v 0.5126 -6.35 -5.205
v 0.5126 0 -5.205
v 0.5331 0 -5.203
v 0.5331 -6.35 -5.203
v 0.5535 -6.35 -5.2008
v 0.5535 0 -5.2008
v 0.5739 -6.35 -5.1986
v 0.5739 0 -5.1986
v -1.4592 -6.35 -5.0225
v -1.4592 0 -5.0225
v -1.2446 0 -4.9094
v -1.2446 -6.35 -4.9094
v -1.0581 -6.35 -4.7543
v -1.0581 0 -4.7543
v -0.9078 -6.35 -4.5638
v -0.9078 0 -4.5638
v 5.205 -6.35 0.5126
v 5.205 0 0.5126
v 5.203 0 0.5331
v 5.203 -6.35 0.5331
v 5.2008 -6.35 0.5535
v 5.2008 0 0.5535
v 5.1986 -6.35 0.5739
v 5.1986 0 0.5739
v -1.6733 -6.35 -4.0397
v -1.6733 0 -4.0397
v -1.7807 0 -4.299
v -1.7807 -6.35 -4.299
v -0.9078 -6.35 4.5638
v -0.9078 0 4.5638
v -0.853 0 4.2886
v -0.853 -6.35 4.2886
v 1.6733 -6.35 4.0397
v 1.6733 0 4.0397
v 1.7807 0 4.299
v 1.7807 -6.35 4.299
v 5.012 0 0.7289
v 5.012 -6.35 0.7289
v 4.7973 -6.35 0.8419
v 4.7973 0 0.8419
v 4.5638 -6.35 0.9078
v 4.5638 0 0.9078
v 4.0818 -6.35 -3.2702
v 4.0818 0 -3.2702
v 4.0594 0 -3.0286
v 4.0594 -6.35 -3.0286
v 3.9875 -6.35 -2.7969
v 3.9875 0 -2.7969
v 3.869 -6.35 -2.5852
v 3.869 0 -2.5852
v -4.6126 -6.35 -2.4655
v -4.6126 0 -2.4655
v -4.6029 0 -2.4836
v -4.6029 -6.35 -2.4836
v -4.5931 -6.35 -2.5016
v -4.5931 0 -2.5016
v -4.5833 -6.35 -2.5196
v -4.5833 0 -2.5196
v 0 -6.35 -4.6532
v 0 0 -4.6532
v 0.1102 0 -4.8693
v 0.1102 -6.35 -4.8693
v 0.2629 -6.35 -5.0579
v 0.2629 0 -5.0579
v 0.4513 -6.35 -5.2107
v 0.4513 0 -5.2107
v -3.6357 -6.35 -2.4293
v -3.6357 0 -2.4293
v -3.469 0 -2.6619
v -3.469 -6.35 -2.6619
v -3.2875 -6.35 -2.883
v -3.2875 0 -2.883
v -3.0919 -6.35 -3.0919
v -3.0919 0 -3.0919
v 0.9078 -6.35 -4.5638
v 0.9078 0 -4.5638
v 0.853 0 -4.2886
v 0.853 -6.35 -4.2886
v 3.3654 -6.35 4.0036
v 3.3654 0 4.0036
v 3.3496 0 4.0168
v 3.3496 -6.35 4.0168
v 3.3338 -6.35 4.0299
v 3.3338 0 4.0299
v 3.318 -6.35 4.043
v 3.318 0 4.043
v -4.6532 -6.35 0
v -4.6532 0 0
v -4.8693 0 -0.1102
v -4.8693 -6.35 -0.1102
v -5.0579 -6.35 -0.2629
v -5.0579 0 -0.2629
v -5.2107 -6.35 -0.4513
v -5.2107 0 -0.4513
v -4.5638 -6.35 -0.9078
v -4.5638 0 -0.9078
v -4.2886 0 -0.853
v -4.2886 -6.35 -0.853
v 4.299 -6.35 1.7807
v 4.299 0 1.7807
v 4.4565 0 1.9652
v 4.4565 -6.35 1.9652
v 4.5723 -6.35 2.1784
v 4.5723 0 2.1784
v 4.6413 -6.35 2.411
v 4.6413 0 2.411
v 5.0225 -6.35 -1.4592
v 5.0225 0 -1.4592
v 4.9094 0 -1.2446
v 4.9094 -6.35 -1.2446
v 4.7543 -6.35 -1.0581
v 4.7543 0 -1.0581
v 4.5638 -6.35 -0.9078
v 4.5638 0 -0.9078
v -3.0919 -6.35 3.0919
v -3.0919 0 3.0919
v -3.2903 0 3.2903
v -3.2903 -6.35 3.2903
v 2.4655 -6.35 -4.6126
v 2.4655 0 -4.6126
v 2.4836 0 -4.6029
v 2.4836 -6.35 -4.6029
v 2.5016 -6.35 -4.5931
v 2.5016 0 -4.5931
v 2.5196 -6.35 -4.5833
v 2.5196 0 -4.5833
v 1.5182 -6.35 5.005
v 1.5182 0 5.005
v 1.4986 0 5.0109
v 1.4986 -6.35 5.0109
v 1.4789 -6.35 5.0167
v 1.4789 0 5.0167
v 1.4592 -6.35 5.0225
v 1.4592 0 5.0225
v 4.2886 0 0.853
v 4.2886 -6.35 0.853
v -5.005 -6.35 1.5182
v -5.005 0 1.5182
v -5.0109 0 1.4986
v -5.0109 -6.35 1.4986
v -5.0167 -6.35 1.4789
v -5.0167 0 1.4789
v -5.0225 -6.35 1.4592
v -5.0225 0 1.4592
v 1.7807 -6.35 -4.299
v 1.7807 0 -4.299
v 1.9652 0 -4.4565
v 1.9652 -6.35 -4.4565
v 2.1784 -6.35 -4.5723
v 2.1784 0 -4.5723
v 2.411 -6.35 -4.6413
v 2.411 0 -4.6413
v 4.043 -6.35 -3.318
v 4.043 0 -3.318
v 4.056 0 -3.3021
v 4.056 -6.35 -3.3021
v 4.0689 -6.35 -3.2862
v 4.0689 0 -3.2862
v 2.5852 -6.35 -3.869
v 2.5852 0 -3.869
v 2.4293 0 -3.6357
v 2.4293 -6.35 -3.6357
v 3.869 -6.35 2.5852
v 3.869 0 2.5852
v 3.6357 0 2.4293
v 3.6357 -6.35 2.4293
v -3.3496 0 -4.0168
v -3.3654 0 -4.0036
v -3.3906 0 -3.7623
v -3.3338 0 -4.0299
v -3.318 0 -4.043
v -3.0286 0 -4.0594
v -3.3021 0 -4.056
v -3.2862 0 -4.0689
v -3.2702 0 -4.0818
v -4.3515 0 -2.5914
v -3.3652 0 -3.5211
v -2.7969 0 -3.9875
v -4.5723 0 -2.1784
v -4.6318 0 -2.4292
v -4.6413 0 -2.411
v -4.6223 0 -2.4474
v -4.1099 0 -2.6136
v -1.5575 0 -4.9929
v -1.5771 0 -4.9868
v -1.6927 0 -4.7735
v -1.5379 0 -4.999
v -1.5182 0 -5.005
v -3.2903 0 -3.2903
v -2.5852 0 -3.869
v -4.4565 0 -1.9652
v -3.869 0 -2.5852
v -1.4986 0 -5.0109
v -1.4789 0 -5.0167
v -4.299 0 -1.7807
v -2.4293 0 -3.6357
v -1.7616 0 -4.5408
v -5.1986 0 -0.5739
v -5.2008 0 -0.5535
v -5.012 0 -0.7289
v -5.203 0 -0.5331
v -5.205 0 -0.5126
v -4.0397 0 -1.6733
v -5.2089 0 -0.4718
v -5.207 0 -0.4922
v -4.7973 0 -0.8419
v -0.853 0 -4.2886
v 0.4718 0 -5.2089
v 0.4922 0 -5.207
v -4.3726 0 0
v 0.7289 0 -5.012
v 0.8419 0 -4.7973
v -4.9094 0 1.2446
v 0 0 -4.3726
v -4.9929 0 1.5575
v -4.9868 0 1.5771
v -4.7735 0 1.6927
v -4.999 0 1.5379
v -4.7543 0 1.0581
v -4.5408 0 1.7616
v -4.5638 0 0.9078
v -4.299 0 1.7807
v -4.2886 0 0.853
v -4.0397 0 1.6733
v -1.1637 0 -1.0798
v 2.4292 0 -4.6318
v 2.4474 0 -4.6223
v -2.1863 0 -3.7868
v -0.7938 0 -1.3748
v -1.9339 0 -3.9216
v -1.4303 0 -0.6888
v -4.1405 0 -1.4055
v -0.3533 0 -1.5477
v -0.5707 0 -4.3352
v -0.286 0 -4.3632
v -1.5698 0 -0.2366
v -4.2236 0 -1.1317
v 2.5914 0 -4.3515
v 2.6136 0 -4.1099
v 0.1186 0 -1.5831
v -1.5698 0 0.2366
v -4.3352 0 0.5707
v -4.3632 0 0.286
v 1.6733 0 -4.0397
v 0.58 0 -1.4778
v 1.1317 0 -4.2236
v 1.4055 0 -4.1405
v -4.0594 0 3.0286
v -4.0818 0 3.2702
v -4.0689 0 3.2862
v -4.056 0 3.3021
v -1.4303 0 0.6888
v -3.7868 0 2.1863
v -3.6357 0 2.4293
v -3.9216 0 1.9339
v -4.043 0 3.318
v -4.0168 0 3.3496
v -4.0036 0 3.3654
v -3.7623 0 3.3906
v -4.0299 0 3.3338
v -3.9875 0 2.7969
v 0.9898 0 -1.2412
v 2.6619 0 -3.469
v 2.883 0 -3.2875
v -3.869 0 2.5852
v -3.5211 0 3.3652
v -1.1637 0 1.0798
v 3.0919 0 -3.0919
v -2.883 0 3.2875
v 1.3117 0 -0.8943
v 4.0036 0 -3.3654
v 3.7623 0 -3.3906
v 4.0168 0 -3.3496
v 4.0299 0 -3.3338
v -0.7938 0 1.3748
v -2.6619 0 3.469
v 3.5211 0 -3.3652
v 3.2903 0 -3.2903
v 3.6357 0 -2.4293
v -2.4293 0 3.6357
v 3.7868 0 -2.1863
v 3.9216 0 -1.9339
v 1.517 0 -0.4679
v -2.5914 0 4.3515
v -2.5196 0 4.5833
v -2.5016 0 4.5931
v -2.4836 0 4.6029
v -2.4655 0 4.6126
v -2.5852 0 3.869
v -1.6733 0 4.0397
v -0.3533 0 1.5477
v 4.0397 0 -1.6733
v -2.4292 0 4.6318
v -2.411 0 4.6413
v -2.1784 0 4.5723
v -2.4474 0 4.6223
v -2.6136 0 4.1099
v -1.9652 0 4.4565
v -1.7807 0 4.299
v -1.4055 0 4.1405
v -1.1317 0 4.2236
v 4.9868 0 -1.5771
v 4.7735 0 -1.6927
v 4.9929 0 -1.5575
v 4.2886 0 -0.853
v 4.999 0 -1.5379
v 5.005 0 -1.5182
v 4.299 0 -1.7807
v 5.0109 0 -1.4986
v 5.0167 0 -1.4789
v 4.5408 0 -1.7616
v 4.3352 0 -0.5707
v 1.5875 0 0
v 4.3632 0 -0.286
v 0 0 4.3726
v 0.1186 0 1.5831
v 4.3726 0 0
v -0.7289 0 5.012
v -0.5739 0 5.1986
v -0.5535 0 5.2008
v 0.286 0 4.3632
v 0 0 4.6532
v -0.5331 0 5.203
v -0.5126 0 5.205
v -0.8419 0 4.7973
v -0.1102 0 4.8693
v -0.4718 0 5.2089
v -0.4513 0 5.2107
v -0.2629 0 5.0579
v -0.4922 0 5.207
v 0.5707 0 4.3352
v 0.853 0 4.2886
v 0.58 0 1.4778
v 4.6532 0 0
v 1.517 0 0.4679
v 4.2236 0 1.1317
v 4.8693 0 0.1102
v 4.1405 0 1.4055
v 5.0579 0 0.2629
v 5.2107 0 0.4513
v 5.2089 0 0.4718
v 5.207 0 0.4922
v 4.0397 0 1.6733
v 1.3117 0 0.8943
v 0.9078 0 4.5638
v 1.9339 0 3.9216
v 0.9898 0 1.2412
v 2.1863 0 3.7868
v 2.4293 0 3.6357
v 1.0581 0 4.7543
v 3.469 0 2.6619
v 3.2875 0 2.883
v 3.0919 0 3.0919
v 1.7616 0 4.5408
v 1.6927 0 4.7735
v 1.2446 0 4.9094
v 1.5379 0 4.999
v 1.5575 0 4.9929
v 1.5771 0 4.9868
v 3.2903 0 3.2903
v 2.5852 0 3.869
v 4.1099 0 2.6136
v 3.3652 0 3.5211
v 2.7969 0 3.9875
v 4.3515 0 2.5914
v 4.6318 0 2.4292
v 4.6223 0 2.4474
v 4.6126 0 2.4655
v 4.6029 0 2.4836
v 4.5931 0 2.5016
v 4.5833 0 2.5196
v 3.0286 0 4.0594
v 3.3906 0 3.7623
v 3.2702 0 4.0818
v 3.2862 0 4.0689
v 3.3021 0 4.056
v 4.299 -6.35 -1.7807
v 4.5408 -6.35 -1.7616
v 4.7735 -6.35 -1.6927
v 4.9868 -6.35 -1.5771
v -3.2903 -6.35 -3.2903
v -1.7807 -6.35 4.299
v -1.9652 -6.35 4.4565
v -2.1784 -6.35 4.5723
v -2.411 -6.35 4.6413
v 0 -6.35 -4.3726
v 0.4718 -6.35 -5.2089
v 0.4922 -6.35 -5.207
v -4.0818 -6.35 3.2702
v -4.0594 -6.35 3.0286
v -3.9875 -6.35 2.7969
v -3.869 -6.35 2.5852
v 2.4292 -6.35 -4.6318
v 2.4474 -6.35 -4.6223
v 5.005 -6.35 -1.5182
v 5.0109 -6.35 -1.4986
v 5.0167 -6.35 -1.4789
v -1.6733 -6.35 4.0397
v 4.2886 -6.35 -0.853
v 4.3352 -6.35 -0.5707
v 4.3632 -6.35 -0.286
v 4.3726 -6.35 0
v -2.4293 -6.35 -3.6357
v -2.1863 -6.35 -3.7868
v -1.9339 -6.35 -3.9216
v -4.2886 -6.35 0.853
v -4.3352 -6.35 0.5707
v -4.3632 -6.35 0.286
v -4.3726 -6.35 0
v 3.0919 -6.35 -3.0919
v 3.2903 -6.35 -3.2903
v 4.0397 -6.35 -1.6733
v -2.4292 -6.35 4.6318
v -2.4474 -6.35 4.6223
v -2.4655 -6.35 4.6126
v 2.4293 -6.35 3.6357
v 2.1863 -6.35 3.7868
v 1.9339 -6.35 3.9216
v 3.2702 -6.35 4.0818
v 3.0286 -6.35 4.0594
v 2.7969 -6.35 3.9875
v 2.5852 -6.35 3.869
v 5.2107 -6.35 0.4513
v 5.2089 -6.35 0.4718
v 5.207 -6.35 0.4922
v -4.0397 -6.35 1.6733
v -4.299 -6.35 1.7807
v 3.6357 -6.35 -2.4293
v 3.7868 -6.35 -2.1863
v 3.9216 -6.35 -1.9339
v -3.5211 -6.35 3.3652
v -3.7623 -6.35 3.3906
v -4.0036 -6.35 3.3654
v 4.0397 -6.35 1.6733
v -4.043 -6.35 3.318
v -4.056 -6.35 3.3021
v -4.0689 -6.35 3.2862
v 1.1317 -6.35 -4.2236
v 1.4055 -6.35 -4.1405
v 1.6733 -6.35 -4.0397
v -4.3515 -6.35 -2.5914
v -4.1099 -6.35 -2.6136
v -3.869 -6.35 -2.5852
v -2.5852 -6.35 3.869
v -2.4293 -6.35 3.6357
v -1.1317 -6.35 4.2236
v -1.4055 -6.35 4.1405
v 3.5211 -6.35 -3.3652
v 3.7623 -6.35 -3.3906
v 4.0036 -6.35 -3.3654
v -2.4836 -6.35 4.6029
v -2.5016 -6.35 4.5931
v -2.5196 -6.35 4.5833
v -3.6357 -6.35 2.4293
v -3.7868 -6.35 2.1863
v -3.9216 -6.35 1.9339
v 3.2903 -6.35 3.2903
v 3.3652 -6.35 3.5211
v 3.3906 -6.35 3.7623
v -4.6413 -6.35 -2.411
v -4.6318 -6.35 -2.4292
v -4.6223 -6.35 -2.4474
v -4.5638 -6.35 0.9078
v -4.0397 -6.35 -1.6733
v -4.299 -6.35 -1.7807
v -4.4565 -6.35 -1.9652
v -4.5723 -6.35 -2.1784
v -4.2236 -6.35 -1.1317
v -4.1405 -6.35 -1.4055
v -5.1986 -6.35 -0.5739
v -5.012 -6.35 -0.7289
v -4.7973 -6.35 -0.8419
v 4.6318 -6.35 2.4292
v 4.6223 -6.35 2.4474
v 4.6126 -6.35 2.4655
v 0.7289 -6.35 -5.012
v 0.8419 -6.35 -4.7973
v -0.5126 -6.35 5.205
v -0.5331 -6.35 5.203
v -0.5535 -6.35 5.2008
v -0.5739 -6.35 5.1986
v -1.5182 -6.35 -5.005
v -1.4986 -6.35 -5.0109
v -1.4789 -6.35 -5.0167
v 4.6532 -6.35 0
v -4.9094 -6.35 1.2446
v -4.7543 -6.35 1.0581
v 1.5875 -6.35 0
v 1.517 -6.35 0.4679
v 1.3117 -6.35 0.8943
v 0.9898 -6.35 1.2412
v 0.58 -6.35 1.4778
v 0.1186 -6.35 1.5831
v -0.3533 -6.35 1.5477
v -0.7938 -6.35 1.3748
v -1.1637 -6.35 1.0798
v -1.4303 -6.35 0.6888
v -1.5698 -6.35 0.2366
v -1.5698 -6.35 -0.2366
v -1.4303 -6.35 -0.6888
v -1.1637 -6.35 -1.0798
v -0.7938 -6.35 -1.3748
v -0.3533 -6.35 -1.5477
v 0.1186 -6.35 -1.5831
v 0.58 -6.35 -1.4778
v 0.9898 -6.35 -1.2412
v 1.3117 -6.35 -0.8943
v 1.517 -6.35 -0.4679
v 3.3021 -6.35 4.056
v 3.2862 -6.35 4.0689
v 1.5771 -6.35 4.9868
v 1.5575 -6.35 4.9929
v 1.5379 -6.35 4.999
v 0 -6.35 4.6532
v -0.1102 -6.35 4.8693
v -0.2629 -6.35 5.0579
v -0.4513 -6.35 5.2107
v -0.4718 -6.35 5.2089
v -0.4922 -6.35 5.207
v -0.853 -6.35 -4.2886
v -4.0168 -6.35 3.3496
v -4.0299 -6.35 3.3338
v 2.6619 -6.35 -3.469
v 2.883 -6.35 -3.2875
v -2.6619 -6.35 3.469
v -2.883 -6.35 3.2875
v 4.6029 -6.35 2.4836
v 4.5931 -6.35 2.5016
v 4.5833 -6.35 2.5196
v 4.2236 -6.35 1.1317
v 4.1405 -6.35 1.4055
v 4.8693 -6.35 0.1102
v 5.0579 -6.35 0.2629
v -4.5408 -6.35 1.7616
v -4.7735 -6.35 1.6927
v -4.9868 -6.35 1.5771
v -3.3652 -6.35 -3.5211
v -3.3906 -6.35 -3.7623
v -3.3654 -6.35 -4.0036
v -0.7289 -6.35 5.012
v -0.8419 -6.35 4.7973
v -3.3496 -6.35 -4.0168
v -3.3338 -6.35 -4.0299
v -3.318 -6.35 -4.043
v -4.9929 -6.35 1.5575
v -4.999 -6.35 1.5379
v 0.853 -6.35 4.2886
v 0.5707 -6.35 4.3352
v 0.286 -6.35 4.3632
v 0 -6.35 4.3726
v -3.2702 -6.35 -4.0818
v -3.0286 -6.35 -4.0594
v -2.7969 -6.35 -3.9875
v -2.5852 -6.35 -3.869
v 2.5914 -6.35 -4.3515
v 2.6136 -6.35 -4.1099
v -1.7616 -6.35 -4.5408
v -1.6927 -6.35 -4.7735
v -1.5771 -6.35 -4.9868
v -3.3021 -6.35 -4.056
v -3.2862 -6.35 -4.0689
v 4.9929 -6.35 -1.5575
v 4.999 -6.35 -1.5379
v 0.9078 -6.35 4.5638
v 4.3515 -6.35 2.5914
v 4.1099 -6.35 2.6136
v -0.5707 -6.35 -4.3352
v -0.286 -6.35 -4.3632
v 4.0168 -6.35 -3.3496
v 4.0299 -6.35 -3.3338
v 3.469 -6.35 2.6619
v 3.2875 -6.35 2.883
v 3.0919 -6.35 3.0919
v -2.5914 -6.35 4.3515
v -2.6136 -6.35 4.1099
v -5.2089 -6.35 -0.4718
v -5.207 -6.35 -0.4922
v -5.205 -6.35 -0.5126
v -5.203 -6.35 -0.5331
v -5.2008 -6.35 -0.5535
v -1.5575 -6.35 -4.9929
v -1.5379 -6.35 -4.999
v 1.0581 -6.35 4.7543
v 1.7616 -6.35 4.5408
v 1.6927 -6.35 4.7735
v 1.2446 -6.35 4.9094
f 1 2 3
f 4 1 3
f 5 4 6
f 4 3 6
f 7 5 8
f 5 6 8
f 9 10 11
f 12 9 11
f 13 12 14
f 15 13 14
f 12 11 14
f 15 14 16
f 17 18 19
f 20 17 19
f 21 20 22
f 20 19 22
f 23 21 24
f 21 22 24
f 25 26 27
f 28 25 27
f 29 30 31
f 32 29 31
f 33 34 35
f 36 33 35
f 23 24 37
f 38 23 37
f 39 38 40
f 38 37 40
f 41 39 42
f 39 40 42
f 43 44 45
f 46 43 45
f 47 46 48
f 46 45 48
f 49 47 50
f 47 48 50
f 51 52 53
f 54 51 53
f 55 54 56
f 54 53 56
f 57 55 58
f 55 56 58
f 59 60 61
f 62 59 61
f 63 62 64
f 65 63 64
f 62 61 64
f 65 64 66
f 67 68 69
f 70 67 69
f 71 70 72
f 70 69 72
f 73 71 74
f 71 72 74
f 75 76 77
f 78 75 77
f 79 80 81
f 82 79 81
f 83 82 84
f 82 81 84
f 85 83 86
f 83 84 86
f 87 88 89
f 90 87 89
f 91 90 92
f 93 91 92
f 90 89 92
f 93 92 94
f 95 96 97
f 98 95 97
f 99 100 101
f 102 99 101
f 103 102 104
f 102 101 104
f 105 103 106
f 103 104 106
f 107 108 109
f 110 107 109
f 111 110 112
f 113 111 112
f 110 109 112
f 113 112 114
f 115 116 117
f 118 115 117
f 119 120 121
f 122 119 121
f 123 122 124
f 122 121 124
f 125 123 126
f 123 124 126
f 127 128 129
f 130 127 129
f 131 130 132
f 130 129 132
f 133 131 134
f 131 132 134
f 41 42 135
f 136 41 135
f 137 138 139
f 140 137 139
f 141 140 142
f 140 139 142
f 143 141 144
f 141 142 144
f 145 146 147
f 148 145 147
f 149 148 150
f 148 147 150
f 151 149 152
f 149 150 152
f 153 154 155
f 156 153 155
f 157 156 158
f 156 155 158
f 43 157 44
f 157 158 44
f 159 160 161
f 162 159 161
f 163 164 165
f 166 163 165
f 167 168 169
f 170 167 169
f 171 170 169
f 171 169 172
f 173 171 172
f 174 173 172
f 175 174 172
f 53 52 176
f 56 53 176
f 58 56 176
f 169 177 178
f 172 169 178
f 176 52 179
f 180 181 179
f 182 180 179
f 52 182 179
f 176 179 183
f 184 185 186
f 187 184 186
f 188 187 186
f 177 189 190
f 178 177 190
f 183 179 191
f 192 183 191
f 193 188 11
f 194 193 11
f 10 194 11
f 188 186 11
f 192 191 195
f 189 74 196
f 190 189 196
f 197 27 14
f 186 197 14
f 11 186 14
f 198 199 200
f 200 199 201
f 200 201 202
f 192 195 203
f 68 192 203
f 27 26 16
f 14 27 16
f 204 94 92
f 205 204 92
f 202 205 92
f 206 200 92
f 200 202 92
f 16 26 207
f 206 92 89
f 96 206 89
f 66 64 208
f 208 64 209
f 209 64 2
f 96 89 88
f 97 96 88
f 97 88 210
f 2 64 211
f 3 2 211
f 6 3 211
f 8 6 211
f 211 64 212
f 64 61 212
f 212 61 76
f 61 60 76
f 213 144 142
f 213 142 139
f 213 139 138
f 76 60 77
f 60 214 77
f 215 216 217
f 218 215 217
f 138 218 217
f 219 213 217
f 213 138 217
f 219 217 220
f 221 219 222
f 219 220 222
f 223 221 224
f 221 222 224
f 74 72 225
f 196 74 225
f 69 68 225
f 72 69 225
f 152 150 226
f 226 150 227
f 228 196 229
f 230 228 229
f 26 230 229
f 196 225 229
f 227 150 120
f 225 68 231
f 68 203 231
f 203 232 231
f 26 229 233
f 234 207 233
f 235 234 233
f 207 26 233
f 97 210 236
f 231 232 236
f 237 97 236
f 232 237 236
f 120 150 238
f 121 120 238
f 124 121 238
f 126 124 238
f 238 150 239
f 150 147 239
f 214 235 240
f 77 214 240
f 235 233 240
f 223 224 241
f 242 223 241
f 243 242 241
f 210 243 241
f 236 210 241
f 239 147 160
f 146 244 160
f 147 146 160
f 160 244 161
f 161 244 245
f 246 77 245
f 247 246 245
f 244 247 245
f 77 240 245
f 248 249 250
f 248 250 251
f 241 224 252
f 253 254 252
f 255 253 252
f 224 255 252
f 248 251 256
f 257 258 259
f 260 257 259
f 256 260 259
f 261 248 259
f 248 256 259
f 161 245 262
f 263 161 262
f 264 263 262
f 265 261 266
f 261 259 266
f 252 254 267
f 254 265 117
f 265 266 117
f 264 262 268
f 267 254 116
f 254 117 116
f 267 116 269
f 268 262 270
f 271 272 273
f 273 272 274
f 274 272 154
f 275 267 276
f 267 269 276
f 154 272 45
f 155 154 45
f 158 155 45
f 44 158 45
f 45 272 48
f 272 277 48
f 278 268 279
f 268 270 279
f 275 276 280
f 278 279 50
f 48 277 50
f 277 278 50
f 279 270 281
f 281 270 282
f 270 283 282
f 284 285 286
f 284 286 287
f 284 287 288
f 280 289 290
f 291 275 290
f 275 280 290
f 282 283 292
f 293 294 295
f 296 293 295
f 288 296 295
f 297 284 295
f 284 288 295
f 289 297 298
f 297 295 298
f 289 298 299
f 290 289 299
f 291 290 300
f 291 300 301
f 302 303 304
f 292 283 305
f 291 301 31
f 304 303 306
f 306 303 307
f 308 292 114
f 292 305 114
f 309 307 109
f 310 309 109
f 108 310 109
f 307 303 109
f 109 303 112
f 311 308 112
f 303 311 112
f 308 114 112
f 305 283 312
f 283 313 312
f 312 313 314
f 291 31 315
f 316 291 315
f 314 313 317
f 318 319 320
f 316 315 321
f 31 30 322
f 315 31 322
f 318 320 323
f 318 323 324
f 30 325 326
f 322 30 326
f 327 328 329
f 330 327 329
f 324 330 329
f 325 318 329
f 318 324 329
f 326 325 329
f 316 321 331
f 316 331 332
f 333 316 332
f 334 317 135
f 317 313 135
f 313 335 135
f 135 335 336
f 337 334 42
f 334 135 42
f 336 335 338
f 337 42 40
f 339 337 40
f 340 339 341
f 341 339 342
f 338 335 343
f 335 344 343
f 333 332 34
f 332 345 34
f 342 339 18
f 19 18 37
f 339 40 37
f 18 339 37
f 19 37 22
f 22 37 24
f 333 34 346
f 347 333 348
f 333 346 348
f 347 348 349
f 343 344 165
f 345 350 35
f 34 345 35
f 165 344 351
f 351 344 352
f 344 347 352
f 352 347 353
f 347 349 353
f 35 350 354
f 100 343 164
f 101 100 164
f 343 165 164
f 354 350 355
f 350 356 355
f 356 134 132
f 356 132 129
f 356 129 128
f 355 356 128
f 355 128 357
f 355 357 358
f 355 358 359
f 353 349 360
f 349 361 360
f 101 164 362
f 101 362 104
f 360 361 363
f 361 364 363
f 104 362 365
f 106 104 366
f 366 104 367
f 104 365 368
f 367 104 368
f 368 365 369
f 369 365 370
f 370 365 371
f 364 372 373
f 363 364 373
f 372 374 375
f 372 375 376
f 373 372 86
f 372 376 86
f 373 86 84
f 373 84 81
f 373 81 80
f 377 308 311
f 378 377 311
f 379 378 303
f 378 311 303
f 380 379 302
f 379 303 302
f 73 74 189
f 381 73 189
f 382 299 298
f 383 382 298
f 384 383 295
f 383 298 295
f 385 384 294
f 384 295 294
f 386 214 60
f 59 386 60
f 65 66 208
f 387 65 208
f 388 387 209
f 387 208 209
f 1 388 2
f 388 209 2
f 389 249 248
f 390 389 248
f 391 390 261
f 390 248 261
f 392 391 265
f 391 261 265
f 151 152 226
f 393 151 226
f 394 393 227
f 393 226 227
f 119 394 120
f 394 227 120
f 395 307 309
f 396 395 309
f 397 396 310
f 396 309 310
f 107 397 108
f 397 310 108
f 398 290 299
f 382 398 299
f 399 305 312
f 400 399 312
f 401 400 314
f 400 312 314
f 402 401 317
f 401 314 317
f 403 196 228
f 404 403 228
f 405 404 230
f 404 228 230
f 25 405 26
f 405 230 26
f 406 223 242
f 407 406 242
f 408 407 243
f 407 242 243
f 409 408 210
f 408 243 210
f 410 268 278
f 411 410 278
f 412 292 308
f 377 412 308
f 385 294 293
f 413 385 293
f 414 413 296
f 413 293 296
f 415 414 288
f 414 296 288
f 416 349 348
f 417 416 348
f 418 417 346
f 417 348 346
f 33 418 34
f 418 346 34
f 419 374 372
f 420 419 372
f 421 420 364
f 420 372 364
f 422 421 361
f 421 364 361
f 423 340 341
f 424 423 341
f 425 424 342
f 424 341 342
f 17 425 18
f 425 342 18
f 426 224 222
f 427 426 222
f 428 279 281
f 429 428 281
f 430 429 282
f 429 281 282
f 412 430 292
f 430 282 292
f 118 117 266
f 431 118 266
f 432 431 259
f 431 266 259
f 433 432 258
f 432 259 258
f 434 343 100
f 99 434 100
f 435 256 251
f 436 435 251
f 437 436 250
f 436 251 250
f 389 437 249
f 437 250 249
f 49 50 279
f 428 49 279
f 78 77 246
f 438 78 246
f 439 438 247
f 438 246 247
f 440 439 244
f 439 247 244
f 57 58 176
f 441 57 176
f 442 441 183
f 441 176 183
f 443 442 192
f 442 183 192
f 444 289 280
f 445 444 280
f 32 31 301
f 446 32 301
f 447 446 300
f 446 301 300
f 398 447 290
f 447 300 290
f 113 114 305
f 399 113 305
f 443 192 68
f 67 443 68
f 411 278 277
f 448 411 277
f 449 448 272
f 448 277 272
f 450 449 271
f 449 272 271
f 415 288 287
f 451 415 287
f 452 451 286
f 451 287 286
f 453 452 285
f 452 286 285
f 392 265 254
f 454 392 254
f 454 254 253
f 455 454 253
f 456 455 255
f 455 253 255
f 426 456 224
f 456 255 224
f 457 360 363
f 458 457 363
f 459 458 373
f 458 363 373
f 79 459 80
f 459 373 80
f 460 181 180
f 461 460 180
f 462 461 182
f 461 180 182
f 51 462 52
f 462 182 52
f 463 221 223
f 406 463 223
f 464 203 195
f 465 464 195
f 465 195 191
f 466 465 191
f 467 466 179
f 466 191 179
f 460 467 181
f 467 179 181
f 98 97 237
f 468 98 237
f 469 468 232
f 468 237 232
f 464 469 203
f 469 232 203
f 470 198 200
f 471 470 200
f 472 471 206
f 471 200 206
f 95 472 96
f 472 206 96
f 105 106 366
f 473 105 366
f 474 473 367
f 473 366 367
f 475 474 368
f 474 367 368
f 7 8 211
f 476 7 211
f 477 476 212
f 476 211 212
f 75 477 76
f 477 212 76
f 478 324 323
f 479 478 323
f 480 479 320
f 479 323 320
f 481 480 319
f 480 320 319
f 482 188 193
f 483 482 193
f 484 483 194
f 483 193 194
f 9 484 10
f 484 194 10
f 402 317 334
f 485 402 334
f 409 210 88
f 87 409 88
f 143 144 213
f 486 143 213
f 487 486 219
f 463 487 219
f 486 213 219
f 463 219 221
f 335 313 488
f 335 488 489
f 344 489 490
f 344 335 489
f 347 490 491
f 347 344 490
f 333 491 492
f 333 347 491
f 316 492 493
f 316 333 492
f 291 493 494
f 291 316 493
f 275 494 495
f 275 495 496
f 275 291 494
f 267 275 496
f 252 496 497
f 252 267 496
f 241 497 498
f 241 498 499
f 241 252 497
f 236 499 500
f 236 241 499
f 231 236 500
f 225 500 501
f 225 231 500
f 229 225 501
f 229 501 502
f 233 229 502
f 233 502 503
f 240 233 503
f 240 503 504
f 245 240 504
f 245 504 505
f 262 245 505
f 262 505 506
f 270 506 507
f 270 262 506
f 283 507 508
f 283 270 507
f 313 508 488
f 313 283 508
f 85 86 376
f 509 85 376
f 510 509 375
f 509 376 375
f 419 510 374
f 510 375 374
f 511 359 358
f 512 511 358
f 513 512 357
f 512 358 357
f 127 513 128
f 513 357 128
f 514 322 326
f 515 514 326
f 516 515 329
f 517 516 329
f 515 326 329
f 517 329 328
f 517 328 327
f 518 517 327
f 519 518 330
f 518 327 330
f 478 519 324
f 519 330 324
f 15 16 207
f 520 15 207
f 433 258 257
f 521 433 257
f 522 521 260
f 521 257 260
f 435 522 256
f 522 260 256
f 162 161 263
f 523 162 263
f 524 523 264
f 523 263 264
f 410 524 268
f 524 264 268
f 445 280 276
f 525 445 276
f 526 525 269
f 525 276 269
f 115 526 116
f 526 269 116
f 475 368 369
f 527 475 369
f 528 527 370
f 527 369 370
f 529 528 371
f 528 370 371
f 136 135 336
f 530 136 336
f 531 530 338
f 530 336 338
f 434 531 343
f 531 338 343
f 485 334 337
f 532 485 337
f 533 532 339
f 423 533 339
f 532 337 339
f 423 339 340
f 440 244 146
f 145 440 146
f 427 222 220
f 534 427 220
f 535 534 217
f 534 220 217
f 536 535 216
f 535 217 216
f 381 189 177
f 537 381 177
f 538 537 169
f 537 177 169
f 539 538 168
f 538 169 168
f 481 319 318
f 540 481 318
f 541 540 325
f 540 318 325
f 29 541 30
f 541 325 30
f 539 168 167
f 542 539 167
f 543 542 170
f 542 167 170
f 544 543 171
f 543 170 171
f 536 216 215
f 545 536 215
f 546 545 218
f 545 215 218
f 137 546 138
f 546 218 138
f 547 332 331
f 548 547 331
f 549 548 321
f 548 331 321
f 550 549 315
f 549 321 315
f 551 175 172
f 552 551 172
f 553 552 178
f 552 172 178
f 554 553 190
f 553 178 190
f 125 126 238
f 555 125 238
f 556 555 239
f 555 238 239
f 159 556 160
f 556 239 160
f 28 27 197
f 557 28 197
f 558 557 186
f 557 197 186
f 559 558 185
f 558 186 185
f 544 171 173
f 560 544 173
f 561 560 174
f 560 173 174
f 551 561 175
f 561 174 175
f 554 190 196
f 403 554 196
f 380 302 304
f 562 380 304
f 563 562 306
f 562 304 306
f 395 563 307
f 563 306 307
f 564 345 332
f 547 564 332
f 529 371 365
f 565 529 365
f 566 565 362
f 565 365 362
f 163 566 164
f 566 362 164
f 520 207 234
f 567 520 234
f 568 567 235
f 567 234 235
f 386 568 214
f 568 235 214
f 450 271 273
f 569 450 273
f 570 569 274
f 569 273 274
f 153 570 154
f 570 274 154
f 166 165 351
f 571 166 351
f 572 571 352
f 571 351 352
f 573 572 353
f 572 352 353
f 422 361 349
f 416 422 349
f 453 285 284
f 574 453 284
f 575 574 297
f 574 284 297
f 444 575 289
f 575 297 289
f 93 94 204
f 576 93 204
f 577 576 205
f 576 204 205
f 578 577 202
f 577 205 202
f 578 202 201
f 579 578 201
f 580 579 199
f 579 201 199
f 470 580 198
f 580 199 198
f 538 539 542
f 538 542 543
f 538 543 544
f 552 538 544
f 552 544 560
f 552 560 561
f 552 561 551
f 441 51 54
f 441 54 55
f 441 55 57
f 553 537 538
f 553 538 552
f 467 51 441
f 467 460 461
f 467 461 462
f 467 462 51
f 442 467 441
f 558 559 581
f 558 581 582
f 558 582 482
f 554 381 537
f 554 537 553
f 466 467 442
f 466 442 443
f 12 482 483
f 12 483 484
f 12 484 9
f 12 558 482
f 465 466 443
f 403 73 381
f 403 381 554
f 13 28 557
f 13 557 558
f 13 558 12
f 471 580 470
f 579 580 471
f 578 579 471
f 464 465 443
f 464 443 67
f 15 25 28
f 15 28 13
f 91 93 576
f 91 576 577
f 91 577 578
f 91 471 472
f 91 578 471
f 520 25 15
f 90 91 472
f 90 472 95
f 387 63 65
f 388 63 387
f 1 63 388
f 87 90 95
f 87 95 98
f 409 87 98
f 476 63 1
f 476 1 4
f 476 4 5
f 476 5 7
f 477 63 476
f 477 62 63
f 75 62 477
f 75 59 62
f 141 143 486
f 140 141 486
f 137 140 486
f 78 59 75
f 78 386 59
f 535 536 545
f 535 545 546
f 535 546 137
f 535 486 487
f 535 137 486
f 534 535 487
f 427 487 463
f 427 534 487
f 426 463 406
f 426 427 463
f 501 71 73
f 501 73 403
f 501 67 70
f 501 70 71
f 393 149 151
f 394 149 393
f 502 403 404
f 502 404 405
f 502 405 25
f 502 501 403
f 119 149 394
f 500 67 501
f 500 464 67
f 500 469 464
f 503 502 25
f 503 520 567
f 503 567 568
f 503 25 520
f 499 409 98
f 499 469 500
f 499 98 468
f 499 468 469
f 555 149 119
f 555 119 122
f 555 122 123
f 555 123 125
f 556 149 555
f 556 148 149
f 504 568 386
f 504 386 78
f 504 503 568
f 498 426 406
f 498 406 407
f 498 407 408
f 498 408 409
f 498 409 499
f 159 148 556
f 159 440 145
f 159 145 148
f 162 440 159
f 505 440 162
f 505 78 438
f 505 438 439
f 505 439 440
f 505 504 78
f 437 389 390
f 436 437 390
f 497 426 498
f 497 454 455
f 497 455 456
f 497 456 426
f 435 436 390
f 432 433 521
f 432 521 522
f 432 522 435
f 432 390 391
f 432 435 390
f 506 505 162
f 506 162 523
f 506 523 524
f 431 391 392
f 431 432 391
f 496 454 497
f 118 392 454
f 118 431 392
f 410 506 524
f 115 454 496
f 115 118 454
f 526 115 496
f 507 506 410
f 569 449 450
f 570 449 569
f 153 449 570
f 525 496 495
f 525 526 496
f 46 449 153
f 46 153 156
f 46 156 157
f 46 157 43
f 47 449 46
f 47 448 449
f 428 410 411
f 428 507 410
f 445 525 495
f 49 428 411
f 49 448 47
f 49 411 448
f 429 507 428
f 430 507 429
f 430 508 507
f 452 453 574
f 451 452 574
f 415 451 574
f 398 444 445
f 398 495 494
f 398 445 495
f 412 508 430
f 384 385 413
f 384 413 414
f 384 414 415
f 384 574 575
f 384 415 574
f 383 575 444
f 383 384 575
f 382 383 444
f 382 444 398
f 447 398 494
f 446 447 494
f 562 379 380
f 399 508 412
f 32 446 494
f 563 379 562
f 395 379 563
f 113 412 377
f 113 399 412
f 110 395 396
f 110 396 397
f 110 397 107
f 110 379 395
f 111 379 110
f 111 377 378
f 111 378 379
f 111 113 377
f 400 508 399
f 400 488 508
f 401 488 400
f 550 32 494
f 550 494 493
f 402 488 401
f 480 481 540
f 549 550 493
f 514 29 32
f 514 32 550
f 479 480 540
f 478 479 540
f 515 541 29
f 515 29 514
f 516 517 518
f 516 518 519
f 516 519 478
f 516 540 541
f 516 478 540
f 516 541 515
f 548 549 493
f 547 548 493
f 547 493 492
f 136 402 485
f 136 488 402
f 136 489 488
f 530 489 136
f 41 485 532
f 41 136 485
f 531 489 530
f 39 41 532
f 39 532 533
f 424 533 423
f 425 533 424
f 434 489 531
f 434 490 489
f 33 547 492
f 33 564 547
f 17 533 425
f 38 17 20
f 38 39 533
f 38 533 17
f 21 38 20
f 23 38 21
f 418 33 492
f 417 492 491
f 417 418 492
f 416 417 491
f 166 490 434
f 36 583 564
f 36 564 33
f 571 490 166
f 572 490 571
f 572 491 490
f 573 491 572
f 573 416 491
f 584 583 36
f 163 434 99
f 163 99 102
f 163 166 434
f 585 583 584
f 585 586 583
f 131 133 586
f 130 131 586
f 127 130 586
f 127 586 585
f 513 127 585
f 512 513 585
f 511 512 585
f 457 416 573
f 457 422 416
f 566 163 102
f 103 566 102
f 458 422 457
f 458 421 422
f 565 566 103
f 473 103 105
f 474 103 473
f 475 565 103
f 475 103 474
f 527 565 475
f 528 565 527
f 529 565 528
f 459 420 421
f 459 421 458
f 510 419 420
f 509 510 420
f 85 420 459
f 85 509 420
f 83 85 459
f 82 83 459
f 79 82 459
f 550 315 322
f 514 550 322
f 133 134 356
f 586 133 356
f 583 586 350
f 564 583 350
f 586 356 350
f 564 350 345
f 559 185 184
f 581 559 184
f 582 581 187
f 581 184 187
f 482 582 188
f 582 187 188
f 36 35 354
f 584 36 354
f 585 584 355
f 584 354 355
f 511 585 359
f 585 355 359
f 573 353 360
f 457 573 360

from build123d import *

# Parameters (mm, degrees)
F0_R     = 1.5875
F1_DEPTH = 6.35


with BuildPart() as f1:
    # F0 (on Front) → F1 (new body)
    with BuildSketch(Plane.XZ):
        with BuildLine():
            ThreePointArc((0, 4.653198), (-0.181622, 4.967595), (-0.451324, 5.210686))
            ThreePointArc((-0.451324, 5.210686), (-0.481995, 5.207938), (-0.512649, 5.20501))
            ThreePointArc((-0.512649, 5.20501), (-0.543285, 5.201901), (-0.573903, 5.198613))
            ThreePointArc((-0.573903, 5.198613), (-0.790998, 4.907577), (-0.907794, 4.563788))
            Line((-0.907794, 4.563788), (-0.853047, 4.288558))
            ThreePointArc((-0.853047, 4.288558), (-1.269292, 4.184294), (-1.673312, 4.039734))
            Line((-1.673312, 4.039734), (-1.780702, 4.298995))
            ThreePointArc((-1.780702, 4.298995), (-2.068813, 4.519956), (-2.411012, 4.641332))
            ThreePointArc((-2.411012, 4.641332), (-2.438297, 4.627056), (-2.465497, 4.61262))
            ThreePointArc((-2.465497, 4.61262), (-2.492612, 4.598024), (-2.51964, 4.583269))
            ThreePointArc((-2.51964, 4.583269), (-2.608835, 4.231308), (-2.585178, 3.868993))
            Line((-2.585178, 3.868993), (-2.429273, 3.635664))
            ThreePointArc((-2.429273, 3.635664), (-2.773933, 3.380047), (-3.091878, 3.091878))
            Line((-3.091878, 3.091878), (-3.290308, 3.290308))
            ThreePointArc((-3.290308, 3.290308), (-3.641046, 3.384194), (-4.003645, 3.365377))
            ThreePointArc((-4.003645, 3.365377), (-4.02339, 3.341747), (-4.042995, 3.318))
            ThreePointArc((-4.042995, 3.318), (-4.06246, 3.294139), (-4.081785, 3.270164))
            ThreePointArc((-4.081785, 3.270164), (-4.029501, 2.910861), (-3.868993, 2.585178))
            Line((-3.868993, 2.585178), (-3.635664, 2.429273))
            ThreePointArc((-3.635664, 2.429273), (-3.856268, 2.061218), (-4.039734, 1.673312))
            Line((-4.039734, 1.673312), (-4.298995, 1.780702))
            ThreePointArc((-4.298995, 1.780702), (-4.658963, 1.73322), (-4.98676, 1.577074))
            ThreePointArc((-4.98676, 1.577074), (-4.995959, 1.547687), (-5.004984, 1.518245))
            ThreePointArc((-5.004984, 1.518245), (-5.013837, 1.488752), (-5.022515, 1.459206))
            ThreePointArc((-5.022515, 1.459206), (-4.836712, 1.147262), (-4.563788, 0.907794))
            Line((-4.563788, 0.907794), (-4.288558, 0.853047))
            ThreePointArc((-4.288558, 0.853047), (-4.351521, 0.428587), (-4.372576, 0))
            Line((-4.372576, 0), (-4.653198, 0))
            ThreePointArc((-4.653198, 0), (-4.967595, -0.181622), (-5.210686, -0.451324))
            ThreePointArc((-5.210686, -0.451324), (-5.207938, -0.481995), (-5.20501, -0.512649))
            ThreePointArc((-5.20501, -0.512649), (-5.201901, -0.543285), (-5.198613, -0.573903))
            ThreePointArc((-5.198613, -0.573903), (-4.907577, -0.790998), (-4.563788, -0.907794))
            Line((-4.563788, -0.907794), (-4.288558, -0.853047))
            ThreePointArc((-4.288558, -0.853047), (-4.184294, -1.269292), (-4.039734, -1.673312))
            Line((-4.039734, -1.673312), (-4.298995, -1.780702))
            ThreePointArc((-4.298995, -1.780702), (-4.519956, -2.068813), (-4.641332, -2.411012))
            ThreePointArc((-4.641332, -2.411012), (-4.627056, -2.438297), (-4.61262, -2.465497))
            ThreePointArc((-4.61262, -2.465497), (-4.598024, -2.492612), (-4.583269, -2.51964))
            ThreePointArc((-4.583269, -2.51964), (-4.231308, -2.608835), (-3.868993, -2.585178))
            Line((-3.868993, -2.585178), (-3.635664, -2.429273))
            ThreePointArc((-3.635664, -2.429273), (-3.380047, -2.773933), (-3.091878, -3.091878))
            Line((-3.091878, -3.091878), (-3.290308, -3.290308))
            ThreePointArc((-3.290308, -3.290308), (-3.384194, -3.641046), (-3.365377, -4.003645))
            ThreePointArc((-3.365377, -4.003645), (-3.341747, -4.02339), (-3.318, -4.042995))
            ThreePointArc((-3.318, -4.042995), (-3.294139, -4.06246), (-3.270164, -4.081785))
            ThreePointArc((-3.270164, -4.081785), (-2.910861, -4.029501), (-2.585178, -3.868993))
            Line((-2.585178, -3.868993), (-2.429273, -3.635664))
            ThreePointArc((-2.429273, -3.635664), (-2.061218, -3.856268), (-1.673312, -4.039734))
            Line((-1.673312, -4.039734), (-1.780702, -4.298995))
            ThreePointArc((-1.780702, -4.298995), (-1.73322, -4.658963), (-1.577074, -4.98676))
            ThreePointArc((-1.577074, -4.98676), (-1.547687, -4.995959), (-1.518245, -5.004984))
            ThreePointArc((-1.518245, -5.004984), (-1.488752, -5.013837), (-1.459206, -5.022515))
            ThreePointArc((-1.459206, -5.022515), (-1.147262, -4.836712), (-0.907794, -4.563788))
            Line((-0.907794, -4.563788), (-0.853047, -4.288558))
            ThreePointArc((-0.853047, -4.288558), (-0.428587, -4.351521), (0, -4.372576))
            Line((0, -4.372576), (0, -4.653198))
            ThreePointArc((0, -4.653198), (0.181622, -4.967595), (0.451324, -5.210686))
            ThreePointArc((0.451324, -5.210686), (0.481995, -5.207938), (0.512649, -5.20501))
            ThreePointArc((0.512649, -5.20501), (0.543285, -5.201901), (0.573903, -5.198613))
            ThreePointArc((0.573903, -5.198613), (0.790998, -4.907577), (0.907794, -4.563788))
            Line((0.907794, -4.563788), (0.853047, -4.288558))
            ThreePointArc((0.853047, -4.288558), (1.269292, -4.184294), (1.673312, -4.039734))
            Line((1.673312, -4.039734), (1.780702, -4.298995))
            ThreePointArc((1.780702, -4.298995), (2.068813, -4.519956), (2.411012, -4.641332))
            ThreePointArc((2.411012, -4.641332), (2.438297, -4.627056), (2.465497, -4.61262))
            ThreePointArc((2.465497, -4.61262), (2.492612, -4.598024), (2.51964, -4.583269))
            ThreePointArc((2.51964, -4.583269), (2.608835, -4.231308), (2.585178, -3.868993))
            Line((2.585178, -3.868993), (2.429273, -3.635664))
            ThreePointArc((2.429273, -3.635664), (2.773933, -3.380047), (3.091878, -3.091878))
            Line((3.091878, -3.091878), (3.290308, -3.290308))
            ThreePointArc((3.290308, -3.290308), (3.641046, -3.384194), (4.003645, -3.365377))
            ThreePointArc((4.003645, -3.365377), (4.02339, -3.341747), (4.042995, -3.318))
            ThreePointArc((4.042995, -3.318), (4.06246, -3.294139), (4.081785, -3.270164))
            ThreePointArc((4.081785, -3.270164), (4.029501, -2.910861), (3.868993, -2.585178))
            Line((3.868993, -2.585178), (3.635664, -2.429273))
            ThreePointArc((3.635664, -2.429273), (3.856268, -2.061218), (4.039734, -1.673312))
            Line((4.039734, -1.673312), (4.298995, -1.780702))
            ThreePointArc((4.298995, -1.780702), (4.658963, -1.73322), (4.98676, -1.577074))
            ThreePointArc((4.98676, -1.577074), (4.995959, -1.547687), (5.004984, -1.518245))
            ThreePointArc((5.004984, -1.518245), (5.013837, -1.488752), (5.022515, -1.459206))
            ThreePointArc((5.022515, -1.459206), (4.836712, -1.147262), (4.563788, -0.907794))
            Line((4.563788, -0.907794), (4.288558, -0.853047))
            ThreePointArc((4.288558, -0.853047), (4.351521, -0.428587), (4.372576, 0))
            Line((4.372576, 0), (4.653198, 0))
            ThreePointArc((4.653198, 0), (4.967595, 0.181622), (5.210686, 0.451324))
            ThreePointArc((5.210686, 0.451324), (5.207938, 0.481995), (5.20501, 0.512649))
            ThreePointArc((5.20501, 0.512649), (5.201901, 0.543285), (5.198613, 0.573903))
            ThreePointArc((5.198613, 0.573903), (4.907577, 0.790998), (4.563788, 0.907794))
            Line((4.563788, 0.907794), (4.288558, 0.853047))
            ThreePointArc((4.288558, 0.853047), (4.184294, 1.269292), (4.039734, 1.673312))
            Line((4.039734, 1.673312), (4.298995, 1.780702))
            ThreePointArc((4.298995, 1.780702), (4.519956, 2.068813), (4.641332, 2.411012))
            ThreePointArc((4.641332, 2.411012), (4.627056, 2.438297), (4.61262, 2.465497))
            ThreePointArc((4.61262, 2.465497), (4.598024, 2.492612), (4.583269, 2.51964))
            ThreePointArc((4.583269, 2.51964), (4.231308, 2.608835), (3.868993, 2.585178))
            Line((3.868993, 2.585178), (3.635664, 2.429273))
            ThreePointArc((3.635664, 2.429273), (3.380047, 2.773933), (3.091878, 3.091878))
            Line((3.091878, 3.091878), (3.290308, 3.290308))
            ThreePointArc((3.290308, 3.290308), (3.384194, 3.641046), (3.365377, 4.003645))
            ThreePointArc((3.365377, 4.003645), (3.341747, 4.02339), (3.318, 4.042995))
            ThreePointArc((3.318, 4.042995), (3.294139, 4.06246), (3.270164, 4.081785))
            ThreePointArc((3.270164, 4.081785), (2.910861, 4.029501), (2.585178, 3.868993))
            Line((2.585178, 3.868993), (2.429273, 3.635664))
            ThreePointArc((2.429273, 3.635664), (2.061218, 3.856268), (1.673312, 4.039734))
            Line((1.673312, 4.039734), (1.780702, 4.298995))
            ThreePointArc((1.780702, 4.298995), (1.73322, 4.658963), (1.577074, 4.98676))
            ThreePointArc((1.577074, 4.98676), (1.547687, 4.995959), (1.518245, 5.004984))
            ThreePointArc((1.518245, 5.004984), (1.488752, 5.013837), (1.459206, 5.022515))
            ThreePointArc((1.459206, 5.022515), (1.147262, 4.836712), (0.907794, 4.563788))
            Line((0.907794, 4.563788), (0.853047, 4.288558))
            ThreePointArc((0.853047, 4.288558), (0.428587, 4.351521), (0, 4.372576))
            Line((0, 4.372576), (0, 4.653198))
        make_face()
        Circle(F0_R, mode=Mode.SUBTRACT)
    extrude(amount=F1_DEPTH)


solid = f1.part
